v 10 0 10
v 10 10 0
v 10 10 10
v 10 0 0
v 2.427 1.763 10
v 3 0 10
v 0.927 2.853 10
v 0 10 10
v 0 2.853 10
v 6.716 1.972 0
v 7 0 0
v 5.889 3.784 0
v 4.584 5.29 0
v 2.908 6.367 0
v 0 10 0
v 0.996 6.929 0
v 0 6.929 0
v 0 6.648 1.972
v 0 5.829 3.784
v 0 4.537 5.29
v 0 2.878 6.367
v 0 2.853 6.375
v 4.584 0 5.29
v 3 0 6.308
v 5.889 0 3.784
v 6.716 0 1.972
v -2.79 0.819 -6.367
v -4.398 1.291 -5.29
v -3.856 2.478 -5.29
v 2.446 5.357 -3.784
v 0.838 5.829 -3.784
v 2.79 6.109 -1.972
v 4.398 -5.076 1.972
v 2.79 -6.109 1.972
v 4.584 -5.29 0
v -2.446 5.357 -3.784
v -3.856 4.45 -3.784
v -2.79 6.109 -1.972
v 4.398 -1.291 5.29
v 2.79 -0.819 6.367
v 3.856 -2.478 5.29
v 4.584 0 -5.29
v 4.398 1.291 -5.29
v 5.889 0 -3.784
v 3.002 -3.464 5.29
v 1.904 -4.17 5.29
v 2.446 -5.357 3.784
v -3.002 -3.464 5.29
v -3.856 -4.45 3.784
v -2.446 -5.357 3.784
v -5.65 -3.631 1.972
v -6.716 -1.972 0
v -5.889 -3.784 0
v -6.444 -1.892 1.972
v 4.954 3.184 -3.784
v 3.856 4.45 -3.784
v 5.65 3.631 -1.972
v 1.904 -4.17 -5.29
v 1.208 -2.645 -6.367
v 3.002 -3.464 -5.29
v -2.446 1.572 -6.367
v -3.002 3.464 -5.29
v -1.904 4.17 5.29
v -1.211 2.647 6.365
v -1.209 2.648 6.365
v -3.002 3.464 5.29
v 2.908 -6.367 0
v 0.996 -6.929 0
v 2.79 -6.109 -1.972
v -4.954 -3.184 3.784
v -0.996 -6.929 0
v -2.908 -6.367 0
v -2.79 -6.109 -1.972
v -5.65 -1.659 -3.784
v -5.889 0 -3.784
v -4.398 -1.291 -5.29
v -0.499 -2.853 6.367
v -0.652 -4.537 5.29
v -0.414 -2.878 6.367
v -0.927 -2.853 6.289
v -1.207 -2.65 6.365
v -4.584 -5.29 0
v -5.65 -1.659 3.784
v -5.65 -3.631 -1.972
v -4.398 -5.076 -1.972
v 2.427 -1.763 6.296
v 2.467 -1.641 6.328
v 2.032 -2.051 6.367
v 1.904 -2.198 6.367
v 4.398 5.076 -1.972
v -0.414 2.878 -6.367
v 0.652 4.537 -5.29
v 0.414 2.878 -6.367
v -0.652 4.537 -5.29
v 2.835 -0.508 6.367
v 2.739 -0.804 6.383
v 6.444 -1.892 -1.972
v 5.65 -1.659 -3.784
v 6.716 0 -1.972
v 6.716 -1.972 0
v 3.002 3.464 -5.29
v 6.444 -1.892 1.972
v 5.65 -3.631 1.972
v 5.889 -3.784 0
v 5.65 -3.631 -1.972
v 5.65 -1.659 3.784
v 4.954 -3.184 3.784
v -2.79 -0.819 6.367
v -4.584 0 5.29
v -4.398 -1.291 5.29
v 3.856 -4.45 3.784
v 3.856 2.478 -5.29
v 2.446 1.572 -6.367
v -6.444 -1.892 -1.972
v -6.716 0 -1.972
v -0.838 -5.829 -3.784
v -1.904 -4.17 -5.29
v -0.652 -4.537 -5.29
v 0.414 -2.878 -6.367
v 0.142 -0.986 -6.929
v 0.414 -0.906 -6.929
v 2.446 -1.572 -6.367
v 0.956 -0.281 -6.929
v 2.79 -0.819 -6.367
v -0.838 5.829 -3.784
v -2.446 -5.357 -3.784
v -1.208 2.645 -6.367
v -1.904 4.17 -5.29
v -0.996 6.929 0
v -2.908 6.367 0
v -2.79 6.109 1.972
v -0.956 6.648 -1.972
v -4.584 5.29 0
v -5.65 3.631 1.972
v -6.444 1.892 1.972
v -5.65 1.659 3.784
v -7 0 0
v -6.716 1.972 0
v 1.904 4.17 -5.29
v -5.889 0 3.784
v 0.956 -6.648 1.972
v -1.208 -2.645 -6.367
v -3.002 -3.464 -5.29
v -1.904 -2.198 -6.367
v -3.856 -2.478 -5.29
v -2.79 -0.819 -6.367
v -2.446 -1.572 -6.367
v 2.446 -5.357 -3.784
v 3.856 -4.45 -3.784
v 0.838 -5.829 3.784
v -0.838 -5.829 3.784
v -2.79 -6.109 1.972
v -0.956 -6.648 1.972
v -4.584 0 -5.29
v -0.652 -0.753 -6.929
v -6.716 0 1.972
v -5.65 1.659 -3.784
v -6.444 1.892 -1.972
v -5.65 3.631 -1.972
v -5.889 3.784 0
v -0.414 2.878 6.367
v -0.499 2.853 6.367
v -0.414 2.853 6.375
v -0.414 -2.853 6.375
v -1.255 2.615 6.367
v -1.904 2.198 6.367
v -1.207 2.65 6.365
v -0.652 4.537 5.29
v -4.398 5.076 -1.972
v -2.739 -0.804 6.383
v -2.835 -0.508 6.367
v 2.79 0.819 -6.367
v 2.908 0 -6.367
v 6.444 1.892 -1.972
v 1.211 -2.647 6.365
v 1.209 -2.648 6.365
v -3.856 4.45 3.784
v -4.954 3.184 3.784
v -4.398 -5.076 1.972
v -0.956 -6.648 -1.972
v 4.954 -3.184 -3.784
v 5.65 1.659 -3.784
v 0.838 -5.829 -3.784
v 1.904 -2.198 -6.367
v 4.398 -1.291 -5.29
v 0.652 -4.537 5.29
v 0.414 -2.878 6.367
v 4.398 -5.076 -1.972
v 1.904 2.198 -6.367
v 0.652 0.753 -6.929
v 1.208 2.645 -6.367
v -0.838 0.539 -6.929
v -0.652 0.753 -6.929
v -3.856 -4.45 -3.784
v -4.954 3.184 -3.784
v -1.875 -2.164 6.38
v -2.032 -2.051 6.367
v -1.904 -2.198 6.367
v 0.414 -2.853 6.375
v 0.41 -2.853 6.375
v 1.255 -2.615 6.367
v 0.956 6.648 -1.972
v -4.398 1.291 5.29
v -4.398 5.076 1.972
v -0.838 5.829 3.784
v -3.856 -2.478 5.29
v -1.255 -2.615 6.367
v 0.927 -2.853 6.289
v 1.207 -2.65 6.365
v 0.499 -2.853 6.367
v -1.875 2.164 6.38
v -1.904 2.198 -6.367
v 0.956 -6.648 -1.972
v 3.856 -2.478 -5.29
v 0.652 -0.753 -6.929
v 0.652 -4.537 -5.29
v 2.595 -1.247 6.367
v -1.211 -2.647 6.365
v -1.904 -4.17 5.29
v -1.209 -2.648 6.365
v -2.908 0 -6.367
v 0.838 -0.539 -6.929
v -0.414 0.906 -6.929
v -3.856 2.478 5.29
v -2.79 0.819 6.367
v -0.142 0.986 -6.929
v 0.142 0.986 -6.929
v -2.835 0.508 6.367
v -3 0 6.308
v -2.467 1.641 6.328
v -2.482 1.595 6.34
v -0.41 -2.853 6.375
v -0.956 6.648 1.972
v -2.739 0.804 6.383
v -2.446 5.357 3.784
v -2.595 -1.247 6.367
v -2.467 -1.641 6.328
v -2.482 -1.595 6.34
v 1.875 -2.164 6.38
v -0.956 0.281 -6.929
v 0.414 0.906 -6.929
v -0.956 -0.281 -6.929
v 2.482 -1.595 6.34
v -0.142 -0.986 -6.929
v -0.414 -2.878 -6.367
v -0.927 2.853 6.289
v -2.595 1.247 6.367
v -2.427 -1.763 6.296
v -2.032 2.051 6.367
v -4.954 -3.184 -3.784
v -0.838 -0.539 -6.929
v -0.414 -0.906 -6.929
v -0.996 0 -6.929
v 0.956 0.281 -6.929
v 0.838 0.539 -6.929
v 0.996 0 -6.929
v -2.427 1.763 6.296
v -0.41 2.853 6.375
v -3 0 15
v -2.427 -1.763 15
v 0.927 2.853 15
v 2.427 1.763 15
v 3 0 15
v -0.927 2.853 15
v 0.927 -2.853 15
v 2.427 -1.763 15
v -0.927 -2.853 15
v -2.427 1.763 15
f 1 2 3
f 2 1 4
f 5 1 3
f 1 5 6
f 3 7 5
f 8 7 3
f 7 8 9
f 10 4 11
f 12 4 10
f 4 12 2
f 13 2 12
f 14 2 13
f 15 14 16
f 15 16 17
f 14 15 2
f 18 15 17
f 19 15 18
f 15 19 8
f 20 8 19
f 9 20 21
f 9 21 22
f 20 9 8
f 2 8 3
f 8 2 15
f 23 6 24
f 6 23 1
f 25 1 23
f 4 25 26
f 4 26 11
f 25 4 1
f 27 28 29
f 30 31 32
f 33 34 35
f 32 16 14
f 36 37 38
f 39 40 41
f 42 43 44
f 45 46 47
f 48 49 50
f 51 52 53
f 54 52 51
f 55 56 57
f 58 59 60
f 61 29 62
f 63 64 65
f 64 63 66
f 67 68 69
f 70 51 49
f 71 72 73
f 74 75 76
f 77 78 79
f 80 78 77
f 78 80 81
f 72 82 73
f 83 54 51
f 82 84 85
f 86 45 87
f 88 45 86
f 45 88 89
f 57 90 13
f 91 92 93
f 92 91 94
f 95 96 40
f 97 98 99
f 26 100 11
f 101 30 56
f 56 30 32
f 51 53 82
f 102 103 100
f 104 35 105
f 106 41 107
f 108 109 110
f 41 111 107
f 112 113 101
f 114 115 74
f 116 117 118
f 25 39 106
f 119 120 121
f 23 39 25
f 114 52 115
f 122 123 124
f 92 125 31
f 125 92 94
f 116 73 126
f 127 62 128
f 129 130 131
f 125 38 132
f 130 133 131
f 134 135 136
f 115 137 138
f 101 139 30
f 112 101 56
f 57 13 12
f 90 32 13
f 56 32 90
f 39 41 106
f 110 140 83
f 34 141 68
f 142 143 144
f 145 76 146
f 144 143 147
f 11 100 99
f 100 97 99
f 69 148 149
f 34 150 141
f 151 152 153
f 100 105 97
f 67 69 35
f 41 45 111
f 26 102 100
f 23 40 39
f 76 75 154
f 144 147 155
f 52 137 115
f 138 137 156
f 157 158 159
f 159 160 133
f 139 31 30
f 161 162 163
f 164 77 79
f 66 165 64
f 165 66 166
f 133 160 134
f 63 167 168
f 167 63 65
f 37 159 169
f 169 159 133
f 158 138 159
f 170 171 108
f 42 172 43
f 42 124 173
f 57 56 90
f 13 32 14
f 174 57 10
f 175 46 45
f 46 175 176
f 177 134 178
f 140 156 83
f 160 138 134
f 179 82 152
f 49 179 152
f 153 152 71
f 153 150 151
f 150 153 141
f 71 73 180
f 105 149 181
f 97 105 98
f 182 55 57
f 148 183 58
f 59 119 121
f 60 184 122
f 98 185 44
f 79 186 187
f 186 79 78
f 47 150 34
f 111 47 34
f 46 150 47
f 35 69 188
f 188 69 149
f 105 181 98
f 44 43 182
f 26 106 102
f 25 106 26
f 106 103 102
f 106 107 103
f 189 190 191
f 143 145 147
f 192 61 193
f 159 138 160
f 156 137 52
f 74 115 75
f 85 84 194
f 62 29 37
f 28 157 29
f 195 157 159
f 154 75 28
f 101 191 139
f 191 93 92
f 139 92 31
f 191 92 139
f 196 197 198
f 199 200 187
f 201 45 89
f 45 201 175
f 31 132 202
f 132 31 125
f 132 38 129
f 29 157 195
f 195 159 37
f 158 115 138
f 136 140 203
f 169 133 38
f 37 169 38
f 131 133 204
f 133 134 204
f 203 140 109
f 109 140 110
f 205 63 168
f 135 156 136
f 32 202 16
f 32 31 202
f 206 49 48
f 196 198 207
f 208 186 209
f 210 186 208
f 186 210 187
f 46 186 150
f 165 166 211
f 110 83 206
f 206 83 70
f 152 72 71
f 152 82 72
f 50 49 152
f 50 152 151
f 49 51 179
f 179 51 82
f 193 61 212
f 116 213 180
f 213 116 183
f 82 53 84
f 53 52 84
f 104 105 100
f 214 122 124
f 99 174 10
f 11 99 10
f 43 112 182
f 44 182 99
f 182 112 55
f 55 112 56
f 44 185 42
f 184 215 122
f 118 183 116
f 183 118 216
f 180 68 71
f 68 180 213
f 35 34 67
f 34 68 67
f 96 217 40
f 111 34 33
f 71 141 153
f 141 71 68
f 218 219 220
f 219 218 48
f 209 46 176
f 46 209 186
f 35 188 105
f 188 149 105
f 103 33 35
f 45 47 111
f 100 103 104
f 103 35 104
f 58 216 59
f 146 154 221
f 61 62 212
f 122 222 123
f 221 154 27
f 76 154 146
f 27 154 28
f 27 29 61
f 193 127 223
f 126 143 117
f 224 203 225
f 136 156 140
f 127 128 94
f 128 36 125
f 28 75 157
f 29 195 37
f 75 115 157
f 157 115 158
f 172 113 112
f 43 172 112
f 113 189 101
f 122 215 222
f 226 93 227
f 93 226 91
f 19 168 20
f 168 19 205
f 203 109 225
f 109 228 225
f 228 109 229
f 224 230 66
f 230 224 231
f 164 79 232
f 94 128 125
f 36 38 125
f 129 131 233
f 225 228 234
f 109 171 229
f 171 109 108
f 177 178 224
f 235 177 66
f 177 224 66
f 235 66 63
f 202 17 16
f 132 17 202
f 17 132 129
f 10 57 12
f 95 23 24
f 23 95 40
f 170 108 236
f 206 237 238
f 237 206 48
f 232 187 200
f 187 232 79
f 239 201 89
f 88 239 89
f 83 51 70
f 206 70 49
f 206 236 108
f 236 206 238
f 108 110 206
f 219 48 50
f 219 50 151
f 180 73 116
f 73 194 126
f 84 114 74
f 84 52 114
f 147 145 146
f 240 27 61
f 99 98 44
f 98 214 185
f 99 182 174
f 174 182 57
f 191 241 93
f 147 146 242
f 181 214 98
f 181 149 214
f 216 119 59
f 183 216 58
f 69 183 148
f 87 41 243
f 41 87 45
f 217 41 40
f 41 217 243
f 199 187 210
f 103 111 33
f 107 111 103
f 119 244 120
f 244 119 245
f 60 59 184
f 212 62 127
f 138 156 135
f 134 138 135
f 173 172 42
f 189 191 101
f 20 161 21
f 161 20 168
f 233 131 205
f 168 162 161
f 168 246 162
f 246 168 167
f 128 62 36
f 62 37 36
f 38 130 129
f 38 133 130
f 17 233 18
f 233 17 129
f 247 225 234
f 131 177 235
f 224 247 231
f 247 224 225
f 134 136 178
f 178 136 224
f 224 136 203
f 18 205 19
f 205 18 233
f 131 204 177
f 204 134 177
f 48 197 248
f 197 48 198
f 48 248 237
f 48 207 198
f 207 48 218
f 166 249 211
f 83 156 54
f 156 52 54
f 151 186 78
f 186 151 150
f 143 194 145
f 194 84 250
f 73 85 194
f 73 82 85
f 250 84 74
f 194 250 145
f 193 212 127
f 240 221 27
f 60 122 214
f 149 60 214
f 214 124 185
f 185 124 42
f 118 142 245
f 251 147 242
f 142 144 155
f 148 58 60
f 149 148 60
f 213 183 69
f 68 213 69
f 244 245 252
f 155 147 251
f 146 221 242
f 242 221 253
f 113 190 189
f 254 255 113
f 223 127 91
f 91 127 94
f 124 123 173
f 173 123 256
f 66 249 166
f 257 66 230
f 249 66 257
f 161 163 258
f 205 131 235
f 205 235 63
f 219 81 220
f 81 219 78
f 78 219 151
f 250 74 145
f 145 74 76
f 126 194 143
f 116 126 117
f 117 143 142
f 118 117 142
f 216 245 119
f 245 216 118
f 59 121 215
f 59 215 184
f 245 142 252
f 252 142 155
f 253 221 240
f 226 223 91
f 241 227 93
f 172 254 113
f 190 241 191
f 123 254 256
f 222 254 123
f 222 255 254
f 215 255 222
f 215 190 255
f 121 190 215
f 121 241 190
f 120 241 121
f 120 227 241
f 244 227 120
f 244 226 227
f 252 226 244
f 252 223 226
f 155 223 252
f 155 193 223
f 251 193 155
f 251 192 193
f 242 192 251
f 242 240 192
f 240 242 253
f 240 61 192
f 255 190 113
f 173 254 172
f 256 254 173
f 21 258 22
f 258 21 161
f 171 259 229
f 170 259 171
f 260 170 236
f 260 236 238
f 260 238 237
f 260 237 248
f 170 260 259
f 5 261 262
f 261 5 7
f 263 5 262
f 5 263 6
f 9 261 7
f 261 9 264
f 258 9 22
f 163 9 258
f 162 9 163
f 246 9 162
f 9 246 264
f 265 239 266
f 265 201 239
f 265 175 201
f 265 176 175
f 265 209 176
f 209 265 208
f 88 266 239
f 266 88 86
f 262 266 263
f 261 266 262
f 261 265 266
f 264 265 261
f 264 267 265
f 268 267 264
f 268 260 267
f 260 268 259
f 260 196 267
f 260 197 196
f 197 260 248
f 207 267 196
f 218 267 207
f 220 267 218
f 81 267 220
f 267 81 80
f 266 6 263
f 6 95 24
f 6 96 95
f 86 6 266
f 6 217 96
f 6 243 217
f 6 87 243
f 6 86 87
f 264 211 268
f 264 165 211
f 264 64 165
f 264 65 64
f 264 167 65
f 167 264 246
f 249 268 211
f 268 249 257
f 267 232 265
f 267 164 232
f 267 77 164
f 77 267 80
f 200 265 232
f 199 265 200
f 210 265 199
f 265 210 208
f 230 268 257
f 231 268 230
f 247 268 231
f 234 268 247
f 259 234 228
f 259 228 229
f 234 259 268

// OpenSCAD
union() {
    cube([10, 10, 10]);
    sphere(r = 7);
    cylinder(h = 15, r = 3);
}
